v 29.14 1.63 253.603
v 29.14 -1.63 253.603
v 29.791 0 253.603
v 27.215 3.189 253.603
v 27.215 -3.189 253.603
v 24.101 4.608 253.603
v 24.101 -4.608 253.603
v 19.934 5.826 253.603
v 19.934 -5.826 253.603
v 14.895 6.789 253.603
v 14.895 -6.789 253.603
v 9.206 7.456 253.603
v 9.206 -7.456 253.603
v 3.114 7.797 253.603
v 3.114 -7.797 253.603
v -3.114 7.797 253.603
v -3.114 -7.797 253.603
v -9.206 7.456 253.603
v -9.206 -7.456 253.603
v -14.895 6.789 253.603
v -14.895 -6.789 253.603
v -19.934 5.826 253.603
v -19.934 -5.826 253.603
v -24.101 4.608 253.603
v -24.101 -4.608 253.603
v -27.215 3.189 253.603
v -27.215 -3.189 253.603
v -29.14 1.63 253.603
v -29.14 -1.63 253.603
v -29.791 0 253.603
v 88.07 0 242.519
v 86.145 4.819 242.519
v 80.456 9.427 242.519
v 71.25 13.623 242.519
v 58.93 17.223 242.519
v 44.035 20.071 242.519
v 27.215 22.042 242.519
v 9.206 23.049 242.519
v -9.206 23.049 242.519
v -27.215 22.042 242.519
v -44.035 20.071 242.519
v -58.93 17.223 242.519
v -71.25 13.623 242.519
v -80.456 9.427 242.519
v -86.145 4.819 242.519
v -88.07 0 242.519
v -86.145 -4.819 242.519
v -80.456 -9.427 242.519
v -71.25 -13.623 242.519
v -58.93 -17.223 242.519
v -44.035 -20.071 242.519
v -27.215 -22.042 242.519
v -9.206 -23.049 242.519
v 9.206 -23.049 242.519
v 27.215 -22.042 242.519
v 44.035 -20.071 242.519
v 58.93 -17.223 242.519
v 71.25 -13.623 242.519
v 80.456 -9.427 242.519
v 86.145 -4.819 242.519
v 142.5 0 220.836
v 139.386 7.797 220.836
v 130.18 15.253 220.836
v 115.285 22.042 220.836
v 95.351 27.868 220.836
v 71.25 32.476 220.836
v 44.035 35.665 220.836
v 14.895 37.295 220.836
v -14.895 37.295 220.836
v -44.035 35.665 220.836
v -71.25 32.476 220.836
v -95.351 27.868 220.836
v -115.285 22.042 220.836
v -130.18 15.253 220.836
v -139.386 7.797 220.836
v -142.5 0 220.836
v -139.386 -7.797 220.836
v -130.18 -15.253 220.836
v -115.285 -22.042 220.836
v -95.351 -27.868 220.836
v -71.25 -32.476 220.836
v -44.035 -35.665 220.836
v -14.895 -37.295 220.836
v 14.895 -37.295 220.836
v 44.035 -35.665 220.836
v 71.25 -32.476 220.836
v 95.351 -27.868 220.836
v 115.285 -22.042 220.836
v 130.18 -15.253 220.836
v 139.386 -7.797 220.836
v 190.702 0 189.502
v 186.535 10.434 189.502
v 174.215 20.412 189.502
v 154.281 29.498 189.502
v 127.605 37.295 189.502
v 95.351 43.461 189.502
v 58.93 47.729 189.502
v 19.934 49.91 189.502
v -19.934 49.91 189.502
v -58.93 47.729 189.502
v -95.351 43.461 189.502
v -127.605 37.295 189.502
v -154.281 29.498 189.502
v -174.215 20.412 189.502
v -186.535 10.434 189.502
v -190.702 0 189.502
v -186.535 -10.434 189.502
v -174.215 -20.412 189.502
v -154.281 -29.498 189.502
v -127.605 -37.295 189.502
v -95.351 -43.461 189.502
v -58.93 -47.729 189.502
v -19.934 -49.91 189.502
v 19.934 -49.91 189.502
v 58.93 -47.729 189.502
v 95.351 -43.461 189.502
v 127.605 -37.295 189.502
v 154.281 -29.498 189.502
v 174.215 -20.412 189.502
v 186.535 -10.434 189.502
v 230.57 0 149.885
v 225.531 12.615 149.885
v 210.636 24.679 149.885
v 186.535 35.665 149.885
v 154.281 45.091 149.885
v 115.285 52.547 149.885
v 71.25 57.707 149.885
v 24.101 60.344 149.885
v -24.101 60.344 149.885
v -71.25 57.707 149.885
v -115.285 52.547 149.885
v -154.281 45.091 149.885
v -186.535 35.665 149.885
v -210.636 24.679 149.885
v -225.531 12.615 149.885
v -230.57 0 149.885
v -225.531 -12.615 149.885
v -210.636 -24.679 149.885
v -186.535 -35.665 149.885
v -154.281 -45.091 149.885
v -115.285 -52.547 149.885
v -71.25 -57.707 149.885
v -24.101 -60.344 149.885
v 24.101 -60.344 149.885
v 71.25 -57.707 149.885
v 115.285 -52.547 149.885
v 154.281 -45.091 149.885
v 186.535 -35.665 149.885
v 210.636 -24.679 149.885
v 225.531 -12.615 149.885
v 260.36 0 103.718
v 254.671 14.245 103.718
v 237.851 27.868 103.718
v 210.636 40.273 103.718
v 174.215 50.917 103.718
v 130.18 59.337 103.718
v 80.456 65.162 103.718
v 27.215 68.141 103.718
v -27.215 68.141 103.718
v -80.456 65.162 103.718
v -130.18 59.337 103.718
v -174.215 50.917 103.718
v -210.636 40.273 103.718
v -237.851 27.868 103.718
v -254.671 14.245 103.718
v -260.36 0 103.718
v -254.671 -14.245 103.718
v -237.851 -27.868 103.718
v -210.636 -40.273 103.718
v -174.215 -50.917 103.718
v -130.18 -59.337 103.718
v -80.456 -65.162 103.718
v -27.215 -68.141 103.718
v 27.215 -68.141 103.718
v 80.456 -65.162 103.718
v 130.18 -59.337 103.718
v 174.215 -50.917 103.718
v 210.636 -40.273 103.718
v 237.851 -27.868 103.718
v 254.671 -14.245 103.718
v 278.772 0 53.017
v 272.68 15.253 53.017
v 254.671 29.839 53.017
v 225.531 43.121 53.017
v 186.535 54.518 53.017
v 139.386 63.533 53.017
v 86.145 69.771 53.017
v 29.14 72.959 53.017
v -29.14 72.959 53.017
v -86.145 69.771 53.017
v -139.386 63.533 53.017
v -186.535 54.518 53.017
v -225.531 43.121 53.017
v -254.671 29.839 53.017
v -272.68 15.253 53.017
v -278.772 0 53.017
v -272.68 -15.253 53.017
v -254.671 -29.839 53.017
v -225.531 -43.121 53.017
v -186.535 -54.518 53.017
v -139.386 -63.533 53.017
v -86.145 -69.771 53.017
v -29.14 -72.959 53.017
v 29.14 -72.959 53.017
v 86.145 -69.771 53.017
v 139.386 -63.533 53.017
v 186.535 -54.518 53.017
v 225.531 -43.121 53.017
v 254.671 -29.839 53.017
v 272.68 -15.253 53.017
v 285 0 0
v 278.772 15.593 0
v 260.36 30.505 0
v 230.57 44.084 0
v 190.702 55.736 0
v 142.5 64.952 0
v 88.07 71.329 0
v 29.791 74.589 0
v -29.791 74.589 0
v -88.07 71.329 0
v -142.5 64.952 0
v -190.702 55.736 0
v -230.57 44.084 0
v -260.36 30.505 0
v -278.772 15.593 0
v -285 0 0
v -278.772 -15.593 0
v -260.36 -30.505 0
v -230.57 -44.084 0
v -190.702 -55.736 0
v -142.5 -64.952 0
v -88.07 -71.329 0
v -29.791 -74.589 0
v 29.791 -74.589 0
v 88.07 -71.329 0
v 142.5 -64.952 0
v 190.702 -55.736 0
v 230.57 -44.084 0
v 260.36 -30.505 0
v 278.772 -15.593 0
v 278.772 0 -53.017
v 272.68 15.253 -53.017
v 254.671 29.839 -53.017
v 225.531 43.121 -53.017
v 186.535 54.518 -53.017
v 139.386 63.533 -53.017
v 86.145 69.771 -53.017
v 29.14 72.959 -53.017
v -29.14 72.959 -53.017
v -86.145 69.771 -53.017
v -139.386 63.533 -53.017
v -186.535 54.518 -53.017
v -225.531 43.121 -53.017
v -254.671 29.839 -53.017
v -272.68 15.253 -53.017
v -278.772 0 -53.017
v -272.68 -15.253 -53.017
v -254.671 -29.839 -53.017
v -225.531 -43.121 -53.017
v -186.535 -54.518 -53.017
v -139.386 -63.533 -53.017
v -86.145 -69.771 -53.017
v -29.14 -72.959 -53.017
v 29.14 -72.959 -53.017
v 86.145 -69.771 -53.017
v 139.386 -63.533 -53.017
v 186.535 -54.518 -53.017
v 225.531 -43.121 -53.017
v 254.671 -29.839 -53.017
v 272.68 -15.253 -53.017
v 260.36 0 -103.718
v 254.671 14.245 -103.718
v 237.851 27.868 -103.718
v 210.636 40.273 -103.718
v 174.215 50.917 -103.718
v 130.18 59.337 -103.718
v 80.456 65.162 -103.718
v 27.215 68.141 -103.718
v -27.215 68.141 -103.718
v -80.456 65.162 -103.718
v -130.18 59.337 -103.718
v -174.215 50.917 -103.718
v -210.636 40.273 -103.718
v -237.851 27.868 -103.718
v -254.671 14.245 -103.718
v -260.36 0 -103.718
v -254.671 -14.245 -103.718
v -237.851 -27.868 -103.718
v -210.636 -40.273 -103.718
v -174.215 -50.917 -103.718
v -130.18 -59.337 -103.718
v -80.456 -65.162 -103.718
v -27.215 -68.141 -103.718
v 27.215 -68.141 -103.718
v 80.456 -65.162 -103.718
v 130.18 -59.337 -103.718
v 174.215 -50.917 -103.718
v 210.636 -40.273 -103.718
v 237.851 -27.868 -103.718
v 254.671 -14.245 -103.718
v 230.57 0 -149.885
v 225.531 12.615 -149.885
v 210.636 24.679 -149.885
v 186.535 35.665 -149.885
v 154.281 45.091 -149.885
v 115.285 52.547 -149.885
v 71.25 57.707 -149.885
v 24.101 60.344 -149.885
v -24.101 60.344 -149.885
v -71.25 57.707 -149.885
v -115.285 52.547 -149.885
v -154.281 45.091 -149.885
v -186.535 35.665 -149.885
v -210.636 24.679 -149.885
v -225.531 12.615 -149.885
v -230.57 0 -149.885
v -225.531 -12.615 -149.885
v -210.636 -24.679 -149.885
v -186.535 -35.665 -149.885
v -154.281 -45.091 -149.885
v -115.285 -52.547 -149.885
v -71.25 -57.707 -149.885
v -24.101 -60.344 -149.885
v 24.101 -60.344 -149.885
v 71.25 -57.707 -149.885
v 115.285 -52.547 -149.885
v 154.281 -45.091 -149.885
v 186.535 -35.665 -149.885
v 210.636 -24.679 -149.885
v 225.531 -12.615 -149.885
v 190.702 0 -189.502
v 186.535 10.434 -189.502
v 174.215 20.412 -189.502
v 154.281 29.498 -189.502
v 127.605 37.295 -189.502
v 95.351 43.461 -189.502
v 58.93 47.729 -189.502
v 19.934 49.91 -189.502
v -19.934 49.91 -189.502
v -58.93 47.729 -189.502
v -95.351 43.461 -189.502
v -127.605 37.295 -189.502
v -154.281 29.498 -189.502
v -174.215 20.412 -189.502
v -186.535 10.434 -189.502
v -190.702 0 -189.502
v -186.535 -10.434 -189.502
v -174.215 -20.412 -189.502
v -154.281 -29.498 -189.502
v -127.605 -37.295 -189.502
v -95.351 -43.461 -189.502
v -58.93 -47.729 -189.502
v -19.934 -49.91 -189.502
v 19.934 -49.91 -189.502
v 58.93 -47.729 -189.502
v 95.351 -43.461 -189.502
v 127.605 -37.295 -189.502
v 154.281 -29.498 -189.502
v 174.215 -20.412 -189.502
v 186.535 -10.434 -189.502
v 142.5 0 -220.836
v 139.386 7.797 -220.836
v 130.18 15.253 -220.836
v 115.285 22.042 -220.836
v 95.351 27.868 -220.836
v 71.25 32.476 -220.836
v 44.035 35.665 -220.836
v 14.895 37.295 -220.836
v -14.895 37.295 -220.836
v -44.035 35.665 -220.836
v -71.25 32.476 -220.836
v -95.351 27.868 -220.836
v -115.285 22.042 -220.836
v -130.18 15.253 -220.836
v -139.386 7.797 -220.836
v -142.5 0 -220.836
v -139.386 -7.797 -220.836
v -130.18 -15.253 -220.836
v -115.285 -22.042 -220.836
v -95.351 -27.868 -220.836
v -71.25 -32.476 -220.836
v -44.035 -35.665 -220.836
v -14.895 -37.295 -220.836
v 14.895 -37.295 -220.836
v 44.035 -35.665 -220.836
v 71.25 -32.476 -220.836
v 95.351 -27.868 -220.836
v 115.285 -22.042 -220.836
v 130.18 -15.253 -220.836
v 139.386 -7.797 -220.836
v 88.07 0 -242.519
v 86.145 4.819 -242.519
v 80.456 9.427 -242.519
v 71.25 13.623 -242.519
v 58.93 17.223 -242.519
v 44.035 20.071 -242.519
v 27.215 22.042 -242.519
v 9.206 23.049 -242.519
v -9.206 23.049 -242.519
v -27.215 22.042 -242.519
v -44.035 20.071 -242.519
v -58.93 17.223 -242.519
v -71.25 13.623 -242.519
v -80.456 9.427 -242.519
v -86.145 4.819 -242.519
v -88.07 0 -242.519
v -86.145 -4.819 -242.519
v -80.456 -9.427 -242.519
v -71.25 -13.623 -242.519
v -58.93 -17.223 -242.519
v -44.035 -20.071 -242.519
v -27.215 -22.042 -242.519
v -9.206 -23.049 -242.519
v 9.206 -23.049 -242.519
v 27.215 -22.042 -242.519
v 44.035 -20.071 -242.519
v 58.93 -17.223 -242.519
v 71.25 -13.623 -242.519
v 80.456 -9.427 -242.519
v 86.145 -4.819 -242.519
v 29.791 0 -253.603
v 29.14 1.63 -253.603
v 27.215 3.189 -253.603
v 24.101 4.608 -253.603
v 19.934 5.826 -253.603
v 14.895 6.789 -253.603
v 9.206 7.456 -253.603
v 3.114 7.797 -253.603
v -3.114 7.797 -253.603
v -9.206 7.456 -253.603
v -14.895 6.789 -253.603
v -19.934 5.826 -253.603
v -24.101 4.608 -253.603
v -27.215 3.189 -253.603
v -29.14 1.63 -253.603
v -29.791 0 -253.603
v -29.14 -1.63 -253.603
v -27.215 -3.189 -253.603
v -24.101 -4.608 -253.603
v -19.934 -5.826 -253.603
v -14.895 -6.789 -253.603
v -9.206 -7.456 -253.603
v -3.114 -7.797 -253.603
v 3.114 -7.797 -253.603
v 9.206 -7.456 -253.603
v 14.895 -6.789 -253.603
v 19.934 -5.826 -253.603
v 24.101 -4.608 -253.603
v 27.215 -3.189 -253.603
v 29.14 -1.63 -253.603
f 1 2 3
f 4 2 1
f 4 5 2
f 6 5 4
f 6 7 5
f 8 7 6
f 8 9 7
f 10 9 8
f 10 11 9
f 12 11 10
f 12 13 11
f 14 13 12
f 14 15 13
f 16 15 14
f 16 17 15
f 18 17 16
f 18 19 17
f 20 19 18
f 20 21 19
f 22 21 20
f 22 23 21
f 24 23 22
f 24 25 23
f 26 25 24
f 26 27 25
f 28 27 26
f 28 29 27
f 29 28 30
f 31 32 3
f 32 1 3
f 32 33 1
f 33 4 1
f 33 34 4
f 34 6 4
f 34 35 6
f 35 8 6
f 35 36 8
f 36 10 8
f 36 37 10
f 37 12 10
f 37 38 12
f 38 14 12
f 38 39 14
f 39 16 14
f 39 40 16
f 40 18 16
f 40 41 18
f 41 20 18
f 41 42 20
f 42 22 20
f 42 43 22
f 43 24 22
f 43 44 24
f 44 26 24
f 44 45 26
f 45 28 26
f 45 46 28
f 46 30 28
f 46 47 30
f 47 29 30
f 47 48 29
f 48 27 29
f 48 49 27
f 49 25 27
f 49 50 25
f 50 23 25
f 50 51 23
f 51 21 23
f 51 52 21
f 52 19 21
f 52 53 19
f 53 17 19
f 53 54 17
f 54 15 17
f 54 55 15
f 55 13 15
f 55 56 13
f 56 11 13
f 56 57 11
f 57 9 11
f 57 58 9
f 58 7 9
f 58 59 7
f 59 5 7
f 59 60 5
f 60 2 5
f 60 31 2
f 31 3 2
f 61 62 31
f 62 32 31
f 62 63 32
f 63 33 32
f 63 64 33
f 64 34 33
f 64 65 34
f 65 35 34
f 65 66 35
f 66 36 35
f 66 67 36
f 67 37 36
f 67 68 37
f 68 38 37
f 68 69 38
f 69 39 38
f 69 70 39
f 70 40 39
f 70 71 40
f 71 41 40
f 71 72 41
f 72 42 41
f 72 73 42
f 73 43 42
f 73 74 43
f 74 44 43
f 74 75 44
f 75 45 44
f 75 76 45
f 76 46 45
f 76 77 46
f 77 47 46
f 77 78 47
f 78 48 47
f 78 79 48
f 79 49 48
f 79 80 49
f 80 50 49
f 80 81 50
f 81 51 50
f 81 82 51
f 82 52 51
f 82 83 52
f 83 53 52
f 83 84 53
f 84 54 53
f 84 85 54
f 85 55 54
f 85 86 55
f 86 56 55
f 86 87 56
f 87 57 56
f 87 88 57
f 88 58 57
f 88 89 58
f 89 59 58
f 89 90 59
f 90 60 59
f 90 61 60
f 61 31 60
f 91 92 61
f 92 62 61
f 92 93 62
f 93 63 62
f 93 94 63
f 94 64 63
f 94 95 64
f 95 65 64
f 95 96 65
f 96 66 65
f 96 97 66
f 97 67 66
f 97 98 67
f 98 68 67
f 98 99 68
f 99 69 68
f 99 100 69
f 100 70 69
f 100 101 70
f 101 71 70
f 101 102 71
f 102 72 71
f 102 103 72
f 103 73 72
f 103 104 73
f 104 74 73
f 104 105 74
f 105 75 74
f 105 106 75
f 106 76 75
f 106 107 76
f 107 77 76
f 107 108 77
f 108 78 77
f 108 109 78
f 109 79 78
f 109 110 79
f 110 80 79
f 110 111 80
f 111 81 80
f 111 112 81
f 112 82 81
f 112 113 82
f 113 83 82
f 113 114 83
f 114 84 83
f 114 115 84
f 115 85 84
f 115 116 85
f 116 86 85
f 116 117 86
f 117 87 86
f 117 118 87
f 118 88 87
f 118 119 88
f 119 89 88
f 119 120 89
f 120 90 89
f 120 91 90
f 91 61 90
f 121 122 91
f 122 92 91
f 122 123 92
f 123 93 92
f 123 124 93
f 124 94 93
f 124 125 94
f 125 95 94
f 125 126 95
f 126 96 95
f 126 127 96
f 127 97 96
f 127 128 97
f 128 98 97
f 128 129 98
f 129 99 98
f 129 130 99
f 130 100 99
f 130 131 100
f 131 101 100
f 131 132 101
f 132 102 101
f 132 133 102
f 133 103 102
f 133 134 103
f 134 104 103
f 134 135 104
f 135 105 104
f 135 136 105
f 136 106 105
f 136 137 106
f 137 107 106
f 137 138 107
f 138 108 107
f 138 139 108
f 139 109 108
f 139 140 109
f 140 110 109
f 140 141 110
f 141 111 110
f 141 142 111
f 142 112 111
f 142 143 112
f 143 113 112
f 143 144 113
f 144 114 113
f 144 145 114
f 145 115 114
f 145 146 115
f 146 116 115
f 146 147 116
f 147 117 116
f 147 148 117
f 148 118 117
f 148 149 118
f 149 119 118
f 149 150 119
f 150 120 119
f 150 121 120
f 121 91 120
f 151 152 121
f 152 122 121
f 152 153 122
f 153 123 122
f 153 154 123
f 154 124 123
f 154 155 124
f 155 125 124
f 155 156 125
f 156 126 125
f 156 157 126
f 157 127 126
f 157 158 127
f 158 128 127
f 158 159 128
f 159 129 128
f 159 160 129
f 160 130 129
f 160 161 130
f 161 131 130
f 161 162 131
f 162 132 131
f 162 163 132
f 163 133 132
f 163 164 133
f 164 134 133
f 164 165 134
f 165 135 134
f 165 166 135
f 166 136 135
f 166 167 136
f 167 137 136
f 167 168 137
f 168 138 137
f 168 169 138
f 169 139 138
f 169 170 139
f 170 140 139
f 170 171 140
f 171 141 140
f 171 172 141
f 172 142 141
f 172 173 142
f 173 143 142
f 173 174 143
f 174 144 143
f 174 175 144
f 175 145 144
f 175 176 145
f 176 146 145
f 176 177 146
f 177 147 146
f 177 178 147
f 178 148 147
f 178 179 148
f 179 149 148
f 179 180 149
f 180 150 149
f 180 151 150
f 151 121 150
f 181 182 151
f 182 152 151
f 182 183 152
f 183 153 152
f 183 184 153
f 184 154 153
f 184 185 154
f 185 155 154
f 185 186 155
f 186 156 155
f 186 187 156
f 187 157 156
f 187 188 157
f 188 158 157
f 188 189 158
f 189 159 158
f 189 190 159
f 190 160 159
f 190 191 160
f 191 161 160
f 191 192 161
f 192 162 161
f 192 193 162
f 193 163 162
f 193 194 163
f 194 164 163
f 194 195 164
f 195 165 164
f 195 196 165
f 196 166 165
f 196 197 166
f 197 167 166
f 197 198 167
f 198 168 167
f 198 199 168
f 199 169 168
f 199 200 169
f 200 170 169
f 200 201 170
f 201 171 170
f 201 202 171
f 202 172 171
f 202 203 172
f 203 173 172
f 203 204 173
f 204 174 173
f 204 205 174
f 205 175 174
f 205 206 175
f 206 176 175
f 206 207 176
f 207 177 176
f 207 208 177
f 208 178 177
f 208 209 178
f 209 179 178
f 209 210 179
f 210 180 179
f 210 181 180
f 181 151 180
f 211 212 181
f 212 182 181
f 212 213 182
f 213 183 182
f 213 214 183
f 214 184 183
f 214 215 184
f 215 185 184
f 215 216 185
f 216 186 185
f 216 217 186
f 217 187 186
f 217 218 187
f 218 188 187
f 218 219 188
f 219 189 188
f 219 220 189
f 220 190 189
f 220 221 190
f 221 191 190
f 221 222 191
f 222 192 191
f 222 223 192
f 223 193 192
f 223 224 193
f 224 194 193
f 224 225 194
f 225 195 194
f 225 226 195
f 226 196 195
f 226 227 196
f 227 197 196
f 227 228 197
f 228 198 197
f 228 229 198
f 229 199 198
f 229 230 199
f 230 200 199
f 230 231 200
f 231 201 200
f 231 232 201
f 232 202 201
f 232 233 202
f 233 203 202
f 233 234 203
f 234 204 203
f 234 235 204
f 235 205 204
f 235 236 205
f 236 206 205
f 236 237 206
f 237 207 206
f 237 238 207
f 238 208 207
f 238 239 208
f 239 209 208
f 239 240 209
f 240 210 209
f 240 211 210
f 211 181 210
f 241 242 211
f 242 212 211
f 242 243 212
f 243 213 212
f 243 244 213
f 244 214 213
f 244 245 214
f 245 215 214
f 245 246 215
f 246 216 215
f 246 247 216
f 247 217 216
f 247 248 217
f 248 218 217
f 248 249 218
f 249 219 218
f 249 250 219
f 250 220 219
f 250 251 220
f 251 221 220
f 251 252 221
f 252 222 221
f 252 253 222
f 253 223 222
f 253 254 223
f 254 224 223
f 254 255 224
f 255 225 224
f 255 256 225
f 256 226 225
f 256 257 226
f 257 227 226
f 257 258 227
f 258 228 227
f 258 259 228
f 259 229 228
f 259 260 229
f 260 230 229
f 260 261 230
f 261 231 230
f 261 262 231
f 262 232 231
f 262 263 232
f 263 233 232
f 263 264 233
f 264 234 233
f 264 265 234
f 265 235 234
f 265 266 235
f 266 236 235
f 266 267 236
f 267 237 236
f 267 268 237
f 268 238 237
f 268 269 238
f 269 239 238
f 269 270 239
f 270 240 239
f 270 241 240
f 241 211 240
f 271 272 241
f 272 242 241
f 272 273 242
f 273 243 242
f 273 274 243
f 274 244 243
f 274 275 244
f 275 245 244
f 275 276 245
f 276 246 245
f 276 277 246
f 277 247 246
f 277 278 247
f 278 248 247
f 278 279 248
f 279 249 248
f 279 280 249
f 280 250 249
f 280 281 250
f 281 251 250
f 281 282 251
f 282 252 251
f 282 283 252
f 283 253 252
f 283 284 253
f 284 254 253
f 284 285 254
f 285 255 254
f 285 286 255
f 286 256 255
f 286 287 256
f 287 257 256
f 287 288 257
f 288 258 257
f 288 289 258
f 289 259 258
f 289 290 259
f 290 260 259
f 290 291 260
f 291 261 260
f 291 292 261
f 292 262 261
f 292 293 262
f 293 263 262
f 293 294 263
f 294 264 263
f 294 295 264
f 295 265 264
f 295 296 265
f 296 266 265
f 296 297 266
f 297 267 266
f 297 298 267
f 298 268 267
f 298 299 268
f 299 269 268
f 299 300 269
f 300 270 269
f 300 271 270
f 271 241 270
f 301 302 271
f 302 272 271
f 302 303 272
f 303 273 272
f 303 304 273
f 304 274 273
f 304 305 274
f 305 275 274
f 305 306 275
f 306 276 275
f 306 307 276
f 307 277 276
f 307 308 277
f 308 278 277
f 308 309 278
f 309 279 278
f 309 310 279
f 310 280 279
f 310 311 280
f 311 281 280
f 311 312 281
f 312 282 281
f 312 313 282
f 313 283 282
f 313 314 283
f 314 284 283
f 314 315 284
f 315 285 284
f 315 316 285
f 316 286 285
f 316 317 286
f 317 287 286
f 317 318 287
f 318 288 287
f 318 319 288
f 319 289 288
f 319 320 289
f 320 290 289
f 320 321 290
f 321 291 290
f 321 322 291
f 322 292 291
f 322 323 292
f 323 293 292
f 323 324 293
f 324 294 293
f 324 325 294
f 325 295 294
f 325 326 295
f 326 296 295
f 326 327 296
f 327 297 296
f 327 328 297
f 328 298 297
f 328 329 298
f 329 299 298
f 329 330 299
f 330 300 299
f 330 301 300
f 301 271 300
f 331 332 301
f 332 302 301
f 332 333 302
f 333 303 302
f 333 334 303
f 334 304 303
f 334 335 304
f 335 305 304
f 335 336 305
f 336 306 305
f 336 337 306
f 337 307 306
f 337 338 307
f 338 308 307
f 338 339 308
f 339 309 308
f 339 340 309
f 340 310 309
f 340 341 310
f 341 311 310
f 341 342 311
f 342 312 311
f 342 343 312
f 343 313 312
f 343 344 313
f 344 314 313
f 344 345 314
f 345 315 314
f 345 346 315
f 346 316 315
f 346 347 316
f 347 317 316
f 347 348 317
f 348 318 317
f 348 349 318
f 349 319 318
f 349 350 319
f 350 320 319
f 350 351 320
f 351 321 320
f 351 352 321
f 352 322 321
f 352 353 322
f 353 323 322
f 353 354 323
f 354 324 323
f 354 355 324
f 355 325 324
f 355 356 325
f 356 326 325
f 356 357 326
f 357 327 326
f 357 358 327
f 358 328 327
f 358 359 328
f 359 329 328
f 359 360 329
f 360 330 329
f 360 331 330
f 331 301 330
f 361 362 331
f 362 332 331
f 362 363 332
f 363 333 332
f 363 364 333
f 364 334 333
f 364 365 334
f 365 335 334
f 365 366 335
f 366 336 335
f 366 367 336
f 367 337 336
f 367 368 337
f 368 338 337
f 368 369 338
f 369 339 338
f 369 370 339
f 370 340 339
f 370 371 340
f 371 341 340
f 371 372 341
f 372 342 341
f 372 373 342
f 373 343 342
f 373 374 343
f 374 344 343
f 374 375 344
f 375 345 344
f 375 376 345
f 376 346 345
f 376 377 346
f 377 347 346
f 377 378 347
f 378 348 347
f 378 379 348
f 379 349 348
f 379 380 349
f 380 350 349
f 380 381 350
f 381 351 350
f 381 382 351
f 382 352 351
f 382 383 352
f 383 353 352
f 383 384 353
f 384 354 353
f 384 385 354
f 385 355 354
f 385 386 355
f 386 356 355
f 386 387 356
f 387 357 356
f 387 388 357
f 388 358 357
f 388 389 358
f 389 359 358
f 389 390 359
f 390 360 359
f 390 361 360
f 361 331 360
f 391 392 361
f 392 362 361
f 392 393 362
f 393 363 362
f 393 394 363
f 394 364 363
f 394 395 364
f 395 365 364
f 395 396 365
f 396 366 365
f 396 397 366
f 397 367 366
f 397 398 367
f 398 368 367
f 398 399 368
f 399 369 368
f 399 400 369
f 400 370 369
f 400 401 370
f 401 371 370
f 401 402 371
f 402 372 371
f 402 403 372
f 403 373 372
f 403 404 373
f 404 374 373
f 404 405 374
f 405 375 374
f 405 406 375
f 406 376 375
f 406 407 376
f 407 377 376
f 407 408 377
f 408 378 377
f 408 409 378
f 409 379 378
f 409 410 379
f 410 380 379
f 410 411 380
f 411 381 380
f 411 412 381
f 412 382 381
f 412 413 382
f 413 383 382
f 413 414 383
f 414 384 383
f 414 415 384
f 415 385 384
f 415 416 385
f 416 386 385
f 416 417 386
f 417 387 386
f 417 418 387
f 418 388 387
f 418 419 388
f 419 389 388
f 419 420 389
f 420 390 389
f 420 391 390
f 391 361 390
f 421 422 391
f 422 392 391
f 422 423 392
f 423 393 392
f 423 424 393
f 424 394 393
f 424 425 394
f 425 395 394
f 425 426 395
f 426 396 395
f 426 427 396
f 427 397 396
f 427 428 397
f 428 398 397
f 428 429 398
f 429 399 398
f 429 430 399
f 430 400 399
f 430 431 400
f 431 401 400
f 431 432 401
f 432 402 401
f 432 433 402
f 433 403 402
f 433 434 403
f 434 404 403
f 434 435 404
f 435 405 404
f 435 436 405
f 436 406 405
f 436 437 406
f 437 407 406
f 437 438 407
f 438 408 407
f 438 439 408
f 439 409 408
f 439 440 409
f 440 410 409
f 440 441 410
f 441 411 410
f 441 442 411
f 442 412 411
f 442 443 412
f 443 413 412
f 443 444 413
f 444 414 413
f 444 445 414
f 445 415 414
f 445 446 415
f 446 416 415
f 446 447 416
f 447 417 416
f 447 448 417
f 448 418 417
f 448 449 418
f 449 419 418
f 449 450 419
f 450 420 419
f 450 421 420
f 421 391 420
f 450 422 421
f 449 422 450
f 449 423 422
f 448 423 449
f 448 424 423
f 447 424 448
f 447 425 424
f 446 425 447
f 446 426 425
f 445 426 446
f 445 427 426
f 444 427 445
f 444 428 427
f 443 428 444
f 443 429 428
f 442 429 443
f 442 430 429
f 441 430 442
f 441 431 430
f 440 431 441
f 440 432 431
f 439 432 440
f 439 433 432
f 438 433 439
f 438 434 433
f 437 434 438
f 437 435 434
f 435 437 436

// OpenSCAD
// Generated by SolidPython 1.0.1 on 2020-07-29 00:46:53


scale(v = [19, 5, 17]) {
	sphere(r = 15);
}
/***********************************************
*********      SolidPython code:      **********
************************************************
 
# import packages: SolidPython
from solid import *
from solid.utils import *
from itertools import chain, combinations, permutations


class Resize:

    def __init__(self, scad_file):
        self.scad_file = scad_file
        #self.scad_file = import_scad(scad_file)
        # cone/cylinder param:
        self.r1 = 0
        self.r2 = 0
        self.h = 0
        # rectangular prism param:
        self.w = 0
        self.l = 0
        # ellipse param:
        self.r = 0

    # import OpenScad code (file name corresponds to shape)


    # classify shape + parameters
    def assign(self, param1, param2, param3):
        if self.scad_file == 'cone.scad':
            self.r1 = param1
            self.r2 = param2
            self.h = param3
        elif self.scad_file == 'cylinder.scad':
            self.r1 = param1
            self.r2 = param2
            self.h = param3
        elif self.scad_file == 'rectangularPrism.scad':
            self.h = param1
            self.l = param2
            self.w = param3
        else:
            self.r = param1
            self.h = param2

    # resize parameters
    def iterate(self):
        x = range(3, 20, 2)
        i = 1
        if self.scad_file == 'cone.scad':
            tempList = list(permutations(x, 2))
            for temp in tempList:
                param1 = temp[0]
                param2 = temp[1]
                filepath = 'produced_scad_files/' + 'cone' + str(param1) + '_' + str(param2) + '_' + '.scad'
                scad_render_to_file(cylinder(h=param1, r1=param2, r2=0), filepath)

        elif self.scad_file == 'cylinder.scad':
            tempList = list(permutations(x, 3))
            for temp in tempList:
                param1 = temp[0]
                param2 = temp[1]
                filepath = 'produced_scad_files/' + 'cylinder' + str(param1) + '_' + str(param2) + '_' + '.scad'
                scad_render_to_file(cylinder(h=param1, r1=param2, r2=param2), filepath)

        elif self.scad_file == 'rectangularPrism.scad':
            tempList = list(permutations(x, 3))
            for temp in tempList:
                param1 = temp[0]
                param2 = temp[1]
                param3 = temp[2]
                filepath = 'produced_scad_files/' + 'rectangularPrism' + str(param1) + '_' + str(param2) + '_' + str(
                    param3) + '.scad'
                scad_render_to_file(cube(size=(param1, param2, param3)), filepath)

        elif self.scad_file == 'ellipse.scad':
            tempList = list(permutations(x, 4))
            for temp in tempList:
                param1 = temp[0]
                param2 = temp[1]
                param3 = temp[2]
                param4 = temp[3]
                filepath = 'produced_scad_files/' + 'ellipse' + str(param1) + '_' + str(param2) + '_' + str(param3) + '_' + str(param4) + '.scad'
                scad_render_to_file(scale([param1, param2, param3])(sphere(r=param4)), filepath)

    def render_to_scadfile(self):
        scad_render_to_file(scad, 'example.scad') 
 
************************************************/
